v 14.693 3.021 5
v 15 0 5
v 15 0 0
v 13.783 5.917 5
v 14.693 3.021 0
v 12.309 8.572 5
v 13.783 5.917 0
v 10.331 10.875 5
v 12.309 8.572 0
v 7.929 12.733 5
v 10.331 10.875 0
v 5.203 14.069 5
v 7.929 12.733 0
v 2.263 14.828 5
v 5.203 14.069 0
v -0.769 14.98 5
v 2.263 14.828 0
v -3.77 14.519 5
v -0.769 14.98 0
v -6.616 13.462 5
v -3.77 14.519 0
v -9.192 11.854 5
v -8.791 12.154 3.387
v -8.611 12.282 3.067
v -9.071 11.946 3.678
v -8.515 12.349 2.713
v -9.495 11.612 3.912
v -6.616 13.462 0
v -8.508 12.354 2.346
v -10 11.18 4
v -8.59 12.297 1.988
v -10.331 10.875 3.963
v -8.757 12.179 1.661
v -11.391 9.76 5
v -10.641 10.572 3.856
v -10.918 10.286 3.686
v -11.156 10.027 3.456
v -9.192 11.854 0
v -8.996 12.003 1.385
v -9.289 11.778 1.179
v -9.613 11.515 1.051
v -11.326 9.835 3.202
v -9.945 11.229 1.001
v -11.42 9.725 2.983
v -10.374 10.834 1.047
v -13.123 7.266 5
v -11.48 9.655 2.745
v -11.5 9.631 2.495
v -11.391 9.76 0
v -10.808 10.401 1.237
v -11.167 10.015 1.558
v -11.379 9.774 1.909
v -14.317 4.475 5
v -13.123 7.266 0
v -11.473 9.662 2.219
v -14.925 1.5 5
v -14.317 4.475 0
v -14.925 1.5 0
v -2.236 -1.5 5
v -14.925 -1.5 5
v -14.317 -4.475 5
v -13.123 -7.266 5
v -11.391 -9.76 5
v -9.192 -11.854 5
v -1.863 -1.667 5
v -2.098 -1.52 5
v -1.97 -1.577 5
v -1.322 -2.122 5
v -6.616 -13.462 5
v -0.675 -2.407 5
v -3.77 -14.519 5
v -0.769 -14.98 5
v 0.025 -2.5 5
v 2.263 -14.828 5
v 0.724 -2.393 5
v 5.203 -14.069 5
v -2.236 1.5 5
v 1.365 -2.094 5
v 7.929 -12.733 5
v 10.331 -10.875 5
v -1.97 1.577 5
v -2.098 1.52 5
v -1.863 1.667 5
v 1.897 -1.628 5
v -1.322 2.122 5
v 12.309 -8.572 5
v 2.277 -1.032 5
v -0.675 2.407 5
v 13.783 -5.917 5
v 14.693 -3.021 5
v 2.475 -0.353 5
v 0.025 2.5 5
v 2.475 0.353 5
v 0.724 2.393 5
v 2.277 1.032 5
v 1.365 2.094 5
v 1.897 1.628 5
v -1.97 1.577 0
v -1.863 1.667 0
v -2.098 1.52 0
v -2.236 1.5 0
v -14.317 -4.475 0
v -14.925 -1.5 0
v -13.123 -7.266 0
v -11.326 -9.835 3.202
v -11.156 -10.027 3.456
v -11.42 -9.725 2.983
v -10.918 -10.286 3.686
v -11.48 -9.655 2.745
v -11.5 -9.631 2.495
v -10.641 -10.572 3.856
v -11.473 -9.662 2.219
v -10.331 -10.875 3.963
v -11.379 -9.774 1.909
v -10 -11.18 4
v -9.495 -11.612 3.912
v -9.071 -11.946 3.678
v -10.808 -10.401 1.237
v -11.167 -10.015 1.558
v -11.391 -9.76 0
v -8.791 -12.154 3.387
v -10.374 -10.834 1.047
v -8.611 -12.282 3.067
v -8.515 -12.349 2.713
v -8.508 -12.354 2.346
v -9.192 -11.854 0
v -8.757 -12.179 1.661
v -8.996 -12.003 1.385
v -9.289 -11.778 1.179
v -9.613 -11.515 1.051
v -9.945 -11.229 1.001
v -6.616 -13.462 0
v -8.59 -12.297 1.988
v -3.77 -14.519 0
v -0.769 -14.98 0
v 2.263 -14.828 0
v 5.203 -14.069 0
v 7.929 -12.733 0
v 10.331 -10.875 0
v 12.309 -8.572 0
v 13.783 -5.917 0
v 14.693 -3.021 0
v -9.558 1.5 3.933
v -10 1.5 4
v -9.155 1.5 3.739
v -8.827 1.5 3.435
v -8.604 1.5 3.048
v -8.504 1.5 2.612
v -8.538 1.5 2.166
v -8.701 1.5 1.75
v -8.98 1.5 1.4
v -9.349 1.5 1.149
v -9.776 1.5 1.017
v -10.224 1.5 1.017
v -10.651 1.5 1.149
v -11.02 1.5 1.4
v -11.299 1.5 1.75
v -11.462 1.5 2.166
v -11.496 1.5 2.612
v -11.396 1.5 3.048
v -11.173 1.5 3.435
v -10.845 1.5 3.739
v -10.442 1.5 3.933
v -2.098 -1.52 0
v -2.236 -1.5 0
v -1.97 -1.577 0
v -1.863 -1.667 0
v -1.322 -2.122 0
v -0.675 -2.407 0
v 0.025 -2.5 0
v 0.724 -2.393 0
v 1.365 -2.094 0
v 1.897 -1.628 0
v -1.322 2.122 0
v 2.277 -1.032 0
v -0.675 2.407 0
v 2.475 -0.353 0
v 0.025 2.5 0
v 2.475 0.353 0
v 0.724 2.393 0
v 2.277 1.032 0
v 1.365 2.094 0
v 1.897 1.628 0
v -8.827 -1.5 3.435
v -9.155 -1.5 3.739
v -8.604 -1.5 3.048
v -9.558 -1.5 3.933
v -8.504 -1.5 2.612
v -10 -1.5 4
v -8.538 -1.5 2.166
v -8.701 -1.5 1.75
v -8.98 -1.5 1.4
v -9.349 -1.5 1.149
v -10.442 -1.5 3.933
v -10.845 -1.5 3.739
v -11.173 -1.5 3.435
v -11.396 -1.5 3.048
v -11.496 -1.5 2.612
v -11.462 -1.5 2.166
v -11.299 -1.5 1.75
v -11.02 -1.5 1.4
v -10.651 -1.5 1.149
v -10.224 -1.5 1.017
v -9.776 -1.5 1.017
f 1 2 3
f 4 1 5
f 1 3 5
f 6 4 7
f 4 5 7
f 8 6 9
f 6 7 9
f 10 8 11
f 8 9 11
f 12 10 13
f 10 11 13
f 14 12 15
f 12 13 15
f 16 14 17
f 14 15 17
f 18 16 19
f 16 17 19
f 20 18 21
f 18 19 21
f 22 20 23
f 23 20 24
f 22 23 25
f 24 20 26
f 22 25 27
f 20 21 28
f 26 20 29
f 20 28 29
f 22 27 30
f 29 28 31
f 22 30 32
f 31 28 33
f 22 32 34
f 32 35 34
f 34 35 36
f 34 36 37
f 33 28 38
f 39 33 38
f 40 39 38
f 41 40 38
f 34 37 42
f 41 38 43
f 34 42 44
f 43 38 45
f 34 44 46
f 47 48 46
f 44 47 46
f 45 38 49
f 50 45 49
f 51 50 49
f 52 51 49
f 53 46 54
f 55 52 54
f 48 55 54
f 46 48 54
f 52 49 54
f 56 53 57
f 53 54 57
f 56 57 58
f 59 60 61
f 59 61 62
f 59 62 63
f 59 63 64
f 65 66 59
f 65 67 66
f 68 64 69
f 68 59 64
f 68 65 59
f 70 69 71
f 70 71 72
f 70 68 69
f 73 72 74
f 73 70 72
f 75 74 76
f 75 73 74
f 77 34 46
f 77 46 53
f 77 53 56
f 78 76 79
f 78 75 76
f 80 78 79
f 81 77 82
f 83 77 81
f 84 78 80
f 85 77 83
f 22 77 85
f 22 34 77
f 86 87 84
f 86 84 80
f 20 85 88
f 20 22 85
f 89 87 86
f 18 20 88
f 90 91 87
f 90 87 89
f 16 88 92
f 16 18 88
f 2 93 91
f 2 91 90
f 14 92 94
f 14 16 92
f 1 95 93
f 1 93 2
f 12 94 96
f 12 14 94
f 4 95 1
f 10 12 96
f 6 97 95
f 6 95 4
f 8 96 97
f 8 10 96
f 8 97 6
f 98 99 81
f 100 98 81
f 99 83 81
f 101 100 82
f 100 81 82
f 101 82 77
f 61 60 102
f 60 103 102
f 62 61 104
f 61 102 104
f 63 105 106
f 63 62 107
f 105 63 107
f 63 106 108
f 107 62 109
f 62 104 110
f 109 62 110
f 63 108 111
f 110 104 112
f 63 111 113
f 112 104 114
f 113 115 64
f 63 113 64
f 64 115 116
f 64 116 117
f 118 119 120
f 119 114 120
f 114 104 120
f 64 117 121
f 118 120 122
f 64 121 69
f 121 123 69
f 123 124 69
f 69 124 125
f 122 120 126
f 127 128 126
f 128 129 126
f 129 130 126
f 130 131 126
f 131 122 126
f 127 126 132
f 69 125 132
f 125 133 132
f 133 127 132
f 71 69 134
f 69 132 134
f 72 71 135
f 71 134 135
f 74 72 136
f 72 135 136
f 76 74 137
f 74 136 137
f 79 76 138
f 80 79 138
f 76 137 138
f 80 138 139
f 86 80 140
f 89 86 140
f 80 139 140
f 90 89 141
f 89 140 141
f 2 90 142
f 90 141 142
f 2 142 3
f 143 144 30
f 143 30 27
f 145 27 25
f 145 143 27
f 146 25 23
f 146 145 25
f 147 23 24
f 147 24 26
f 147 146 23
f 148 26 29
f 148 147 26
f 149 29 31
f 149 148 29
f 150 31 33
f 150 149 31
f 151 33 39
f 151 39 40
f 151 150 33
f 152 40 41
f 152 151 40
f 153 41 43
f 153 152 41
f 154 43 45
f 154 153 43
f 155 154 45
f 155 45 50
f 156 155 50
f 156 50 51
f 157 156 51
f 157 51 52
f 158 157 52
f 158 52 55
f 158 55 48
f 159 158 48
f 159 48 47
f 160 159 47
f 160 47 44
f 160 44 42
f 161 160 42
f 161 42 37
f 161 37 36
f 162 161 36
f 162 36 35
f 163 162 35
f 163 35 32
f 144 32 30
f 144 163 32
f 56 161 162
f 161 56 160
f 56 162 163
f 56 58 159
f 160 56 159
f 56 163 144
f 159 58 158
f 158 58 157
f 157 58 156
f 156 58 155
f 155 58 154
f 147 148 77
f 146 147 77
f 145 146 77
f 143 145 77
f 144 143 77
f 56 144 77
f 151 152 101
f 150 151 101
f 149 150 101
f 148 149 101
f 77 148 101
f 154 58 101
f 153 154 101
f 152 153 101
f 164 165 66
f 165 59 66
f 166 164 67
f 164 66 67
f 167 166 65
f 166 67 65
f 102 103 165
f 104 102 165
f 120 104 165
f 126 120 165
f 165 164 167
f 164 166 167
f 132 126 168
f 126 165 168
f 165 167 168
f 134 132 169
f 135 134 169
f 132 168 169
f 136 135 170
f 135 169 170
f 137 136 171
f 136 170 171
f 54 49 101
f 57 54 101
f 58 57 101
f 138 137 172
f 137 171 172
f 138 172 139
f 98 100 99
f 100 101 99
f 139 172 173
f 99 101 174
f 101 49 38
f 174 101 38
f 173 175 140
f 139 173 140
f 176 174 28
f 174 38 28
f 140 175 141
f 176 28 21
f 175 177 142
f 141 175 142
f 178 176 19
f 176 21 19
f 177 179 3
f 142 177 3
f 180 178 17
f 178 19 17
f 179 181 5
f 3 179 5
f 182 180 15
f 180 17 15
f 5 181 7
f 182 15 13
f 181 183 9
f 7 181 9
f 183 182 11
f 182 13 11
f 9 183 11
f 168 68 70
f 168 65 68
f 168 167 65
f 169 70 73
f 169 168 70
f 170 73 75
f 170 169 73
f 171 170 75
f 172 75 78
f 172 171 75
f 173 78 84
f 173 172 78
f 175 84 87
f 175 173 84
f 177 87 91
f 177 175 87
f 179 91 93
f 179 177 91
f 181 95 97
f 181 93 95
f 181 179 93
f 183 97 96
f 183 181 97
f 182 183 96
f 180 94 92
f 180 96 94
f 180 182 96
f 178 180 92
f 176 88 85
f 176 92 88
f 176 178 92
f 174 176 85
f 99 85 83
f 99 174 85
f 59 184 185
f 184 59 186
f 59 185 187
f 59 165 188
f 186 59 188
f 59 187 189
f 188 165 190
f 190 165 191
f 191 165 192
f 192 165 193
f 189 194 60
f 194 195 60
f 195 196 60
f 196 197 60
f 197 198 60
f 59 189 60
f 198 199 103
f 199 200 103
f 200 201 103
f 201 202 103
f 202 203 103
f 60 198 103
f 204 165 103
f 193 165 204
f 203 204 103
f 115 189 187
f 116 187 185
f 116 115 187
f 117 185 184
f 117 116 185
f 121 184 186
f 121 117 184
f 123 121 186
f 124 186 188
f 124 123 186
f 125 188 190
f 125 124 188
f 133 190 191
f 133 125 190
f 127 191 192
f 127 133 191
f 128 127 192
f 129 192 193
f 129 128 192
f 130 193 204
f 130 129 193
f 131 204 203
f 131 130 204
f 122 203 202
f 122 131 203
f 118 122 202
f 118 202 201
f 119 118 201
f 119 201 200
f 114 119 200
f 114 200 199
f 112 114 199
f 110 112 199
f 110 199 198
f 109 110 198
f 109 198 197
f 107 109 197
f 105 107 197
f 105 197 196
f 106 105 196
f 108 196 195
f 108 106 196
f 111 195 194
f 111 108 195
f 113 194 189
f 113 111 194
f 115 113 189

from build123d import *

# Parameters (mm, degrees)
ESQUISSE1_R                  = 15
ESQUISSE1_R_2                = 2.5
BOSS_EXTRU_1_DEPTH           = 5
ENL_V_MAT_EXTRU_1_DEPTH      = 22.794494718
ENL_V_MAT_EXTRU_1_DEPTH_BACK = 22.794494718
ESQUISSE2_R                  = 1.5
ENL_V_START                  = -10
ENL_V_MAT_EXTRU_3_DEPTH      = 10
CONG_2_R                     = 0.5


with BuildPart() as part:
    # Esquisse1 → Boss.-Extru.1 (new body)
    with BuildSketch(Plane.XY):
        Circle(ESQUISSE1_R)
        Circle(ESQUISSE1_R_2, mode=Mode.SUBTRACT)
    extrude(amount=BOSS_EXTRU_1_DEPTH)

    # Esquisse2 → Enlèv. mat.-Extru.1 (cut, two sides: drawn at the far end of the back side and taken through both)
    with BuildSketch(Plane(origin=(0, 0, 0), x_dir=(1, 0, 0), z_dir=(0, 1, 0)).offset(-ENL_V_MAT_EXTRU_1_DEPTH_BACK)):
        with Locations(Location((-10, -2.5, 0), (0, 0, 270))):
            Circle(ESQUISSE2_R)
    extrude(amount=ENL_V_MAT_EXTRU_1_DEPTH + ENL_V_MAT_EXTRU_1_DEPTH_BACK, mode=Mode.SUBTRACT)

    # Esquisse3 → Enlèv. mat.-Extru.3 (cut)
    with BuildSketch(Plane.XY.offset(5).offset(ENL_V_START)):
        with BuildLine():
            Line((-14.924811557, 1.5), (-2.5, 1.5))
            Line((-2.5, 1.5), (-2, 1.5))
            ThreePointArc((-2, 1.5), (-2.5, 0), (-2, -1.5))
            Line((-2, -1.5), (-2.5, -1.5))
            Line((-2.5, -1.5), (-14.924811557, -1.5))
            ThreePointArc((-14.924811557, -1.5), (-15, 0), (-14.924811557, 1.5))
        make_face()
    extrude(amount=ENL_V_MAT_EXTRU_3_DEPTH, mode=Mode.SUBTRACT)

    # Congé2
    cong_2_edges = [part.edges().sort_by_distance(p)[0] for p in [
        (-2, 1.5, 2.5),
        (-2, -1.5, 2.5),
    ]]
    fillet(cong_2_edges, radius=CONG_2_R)


solid = part.part
